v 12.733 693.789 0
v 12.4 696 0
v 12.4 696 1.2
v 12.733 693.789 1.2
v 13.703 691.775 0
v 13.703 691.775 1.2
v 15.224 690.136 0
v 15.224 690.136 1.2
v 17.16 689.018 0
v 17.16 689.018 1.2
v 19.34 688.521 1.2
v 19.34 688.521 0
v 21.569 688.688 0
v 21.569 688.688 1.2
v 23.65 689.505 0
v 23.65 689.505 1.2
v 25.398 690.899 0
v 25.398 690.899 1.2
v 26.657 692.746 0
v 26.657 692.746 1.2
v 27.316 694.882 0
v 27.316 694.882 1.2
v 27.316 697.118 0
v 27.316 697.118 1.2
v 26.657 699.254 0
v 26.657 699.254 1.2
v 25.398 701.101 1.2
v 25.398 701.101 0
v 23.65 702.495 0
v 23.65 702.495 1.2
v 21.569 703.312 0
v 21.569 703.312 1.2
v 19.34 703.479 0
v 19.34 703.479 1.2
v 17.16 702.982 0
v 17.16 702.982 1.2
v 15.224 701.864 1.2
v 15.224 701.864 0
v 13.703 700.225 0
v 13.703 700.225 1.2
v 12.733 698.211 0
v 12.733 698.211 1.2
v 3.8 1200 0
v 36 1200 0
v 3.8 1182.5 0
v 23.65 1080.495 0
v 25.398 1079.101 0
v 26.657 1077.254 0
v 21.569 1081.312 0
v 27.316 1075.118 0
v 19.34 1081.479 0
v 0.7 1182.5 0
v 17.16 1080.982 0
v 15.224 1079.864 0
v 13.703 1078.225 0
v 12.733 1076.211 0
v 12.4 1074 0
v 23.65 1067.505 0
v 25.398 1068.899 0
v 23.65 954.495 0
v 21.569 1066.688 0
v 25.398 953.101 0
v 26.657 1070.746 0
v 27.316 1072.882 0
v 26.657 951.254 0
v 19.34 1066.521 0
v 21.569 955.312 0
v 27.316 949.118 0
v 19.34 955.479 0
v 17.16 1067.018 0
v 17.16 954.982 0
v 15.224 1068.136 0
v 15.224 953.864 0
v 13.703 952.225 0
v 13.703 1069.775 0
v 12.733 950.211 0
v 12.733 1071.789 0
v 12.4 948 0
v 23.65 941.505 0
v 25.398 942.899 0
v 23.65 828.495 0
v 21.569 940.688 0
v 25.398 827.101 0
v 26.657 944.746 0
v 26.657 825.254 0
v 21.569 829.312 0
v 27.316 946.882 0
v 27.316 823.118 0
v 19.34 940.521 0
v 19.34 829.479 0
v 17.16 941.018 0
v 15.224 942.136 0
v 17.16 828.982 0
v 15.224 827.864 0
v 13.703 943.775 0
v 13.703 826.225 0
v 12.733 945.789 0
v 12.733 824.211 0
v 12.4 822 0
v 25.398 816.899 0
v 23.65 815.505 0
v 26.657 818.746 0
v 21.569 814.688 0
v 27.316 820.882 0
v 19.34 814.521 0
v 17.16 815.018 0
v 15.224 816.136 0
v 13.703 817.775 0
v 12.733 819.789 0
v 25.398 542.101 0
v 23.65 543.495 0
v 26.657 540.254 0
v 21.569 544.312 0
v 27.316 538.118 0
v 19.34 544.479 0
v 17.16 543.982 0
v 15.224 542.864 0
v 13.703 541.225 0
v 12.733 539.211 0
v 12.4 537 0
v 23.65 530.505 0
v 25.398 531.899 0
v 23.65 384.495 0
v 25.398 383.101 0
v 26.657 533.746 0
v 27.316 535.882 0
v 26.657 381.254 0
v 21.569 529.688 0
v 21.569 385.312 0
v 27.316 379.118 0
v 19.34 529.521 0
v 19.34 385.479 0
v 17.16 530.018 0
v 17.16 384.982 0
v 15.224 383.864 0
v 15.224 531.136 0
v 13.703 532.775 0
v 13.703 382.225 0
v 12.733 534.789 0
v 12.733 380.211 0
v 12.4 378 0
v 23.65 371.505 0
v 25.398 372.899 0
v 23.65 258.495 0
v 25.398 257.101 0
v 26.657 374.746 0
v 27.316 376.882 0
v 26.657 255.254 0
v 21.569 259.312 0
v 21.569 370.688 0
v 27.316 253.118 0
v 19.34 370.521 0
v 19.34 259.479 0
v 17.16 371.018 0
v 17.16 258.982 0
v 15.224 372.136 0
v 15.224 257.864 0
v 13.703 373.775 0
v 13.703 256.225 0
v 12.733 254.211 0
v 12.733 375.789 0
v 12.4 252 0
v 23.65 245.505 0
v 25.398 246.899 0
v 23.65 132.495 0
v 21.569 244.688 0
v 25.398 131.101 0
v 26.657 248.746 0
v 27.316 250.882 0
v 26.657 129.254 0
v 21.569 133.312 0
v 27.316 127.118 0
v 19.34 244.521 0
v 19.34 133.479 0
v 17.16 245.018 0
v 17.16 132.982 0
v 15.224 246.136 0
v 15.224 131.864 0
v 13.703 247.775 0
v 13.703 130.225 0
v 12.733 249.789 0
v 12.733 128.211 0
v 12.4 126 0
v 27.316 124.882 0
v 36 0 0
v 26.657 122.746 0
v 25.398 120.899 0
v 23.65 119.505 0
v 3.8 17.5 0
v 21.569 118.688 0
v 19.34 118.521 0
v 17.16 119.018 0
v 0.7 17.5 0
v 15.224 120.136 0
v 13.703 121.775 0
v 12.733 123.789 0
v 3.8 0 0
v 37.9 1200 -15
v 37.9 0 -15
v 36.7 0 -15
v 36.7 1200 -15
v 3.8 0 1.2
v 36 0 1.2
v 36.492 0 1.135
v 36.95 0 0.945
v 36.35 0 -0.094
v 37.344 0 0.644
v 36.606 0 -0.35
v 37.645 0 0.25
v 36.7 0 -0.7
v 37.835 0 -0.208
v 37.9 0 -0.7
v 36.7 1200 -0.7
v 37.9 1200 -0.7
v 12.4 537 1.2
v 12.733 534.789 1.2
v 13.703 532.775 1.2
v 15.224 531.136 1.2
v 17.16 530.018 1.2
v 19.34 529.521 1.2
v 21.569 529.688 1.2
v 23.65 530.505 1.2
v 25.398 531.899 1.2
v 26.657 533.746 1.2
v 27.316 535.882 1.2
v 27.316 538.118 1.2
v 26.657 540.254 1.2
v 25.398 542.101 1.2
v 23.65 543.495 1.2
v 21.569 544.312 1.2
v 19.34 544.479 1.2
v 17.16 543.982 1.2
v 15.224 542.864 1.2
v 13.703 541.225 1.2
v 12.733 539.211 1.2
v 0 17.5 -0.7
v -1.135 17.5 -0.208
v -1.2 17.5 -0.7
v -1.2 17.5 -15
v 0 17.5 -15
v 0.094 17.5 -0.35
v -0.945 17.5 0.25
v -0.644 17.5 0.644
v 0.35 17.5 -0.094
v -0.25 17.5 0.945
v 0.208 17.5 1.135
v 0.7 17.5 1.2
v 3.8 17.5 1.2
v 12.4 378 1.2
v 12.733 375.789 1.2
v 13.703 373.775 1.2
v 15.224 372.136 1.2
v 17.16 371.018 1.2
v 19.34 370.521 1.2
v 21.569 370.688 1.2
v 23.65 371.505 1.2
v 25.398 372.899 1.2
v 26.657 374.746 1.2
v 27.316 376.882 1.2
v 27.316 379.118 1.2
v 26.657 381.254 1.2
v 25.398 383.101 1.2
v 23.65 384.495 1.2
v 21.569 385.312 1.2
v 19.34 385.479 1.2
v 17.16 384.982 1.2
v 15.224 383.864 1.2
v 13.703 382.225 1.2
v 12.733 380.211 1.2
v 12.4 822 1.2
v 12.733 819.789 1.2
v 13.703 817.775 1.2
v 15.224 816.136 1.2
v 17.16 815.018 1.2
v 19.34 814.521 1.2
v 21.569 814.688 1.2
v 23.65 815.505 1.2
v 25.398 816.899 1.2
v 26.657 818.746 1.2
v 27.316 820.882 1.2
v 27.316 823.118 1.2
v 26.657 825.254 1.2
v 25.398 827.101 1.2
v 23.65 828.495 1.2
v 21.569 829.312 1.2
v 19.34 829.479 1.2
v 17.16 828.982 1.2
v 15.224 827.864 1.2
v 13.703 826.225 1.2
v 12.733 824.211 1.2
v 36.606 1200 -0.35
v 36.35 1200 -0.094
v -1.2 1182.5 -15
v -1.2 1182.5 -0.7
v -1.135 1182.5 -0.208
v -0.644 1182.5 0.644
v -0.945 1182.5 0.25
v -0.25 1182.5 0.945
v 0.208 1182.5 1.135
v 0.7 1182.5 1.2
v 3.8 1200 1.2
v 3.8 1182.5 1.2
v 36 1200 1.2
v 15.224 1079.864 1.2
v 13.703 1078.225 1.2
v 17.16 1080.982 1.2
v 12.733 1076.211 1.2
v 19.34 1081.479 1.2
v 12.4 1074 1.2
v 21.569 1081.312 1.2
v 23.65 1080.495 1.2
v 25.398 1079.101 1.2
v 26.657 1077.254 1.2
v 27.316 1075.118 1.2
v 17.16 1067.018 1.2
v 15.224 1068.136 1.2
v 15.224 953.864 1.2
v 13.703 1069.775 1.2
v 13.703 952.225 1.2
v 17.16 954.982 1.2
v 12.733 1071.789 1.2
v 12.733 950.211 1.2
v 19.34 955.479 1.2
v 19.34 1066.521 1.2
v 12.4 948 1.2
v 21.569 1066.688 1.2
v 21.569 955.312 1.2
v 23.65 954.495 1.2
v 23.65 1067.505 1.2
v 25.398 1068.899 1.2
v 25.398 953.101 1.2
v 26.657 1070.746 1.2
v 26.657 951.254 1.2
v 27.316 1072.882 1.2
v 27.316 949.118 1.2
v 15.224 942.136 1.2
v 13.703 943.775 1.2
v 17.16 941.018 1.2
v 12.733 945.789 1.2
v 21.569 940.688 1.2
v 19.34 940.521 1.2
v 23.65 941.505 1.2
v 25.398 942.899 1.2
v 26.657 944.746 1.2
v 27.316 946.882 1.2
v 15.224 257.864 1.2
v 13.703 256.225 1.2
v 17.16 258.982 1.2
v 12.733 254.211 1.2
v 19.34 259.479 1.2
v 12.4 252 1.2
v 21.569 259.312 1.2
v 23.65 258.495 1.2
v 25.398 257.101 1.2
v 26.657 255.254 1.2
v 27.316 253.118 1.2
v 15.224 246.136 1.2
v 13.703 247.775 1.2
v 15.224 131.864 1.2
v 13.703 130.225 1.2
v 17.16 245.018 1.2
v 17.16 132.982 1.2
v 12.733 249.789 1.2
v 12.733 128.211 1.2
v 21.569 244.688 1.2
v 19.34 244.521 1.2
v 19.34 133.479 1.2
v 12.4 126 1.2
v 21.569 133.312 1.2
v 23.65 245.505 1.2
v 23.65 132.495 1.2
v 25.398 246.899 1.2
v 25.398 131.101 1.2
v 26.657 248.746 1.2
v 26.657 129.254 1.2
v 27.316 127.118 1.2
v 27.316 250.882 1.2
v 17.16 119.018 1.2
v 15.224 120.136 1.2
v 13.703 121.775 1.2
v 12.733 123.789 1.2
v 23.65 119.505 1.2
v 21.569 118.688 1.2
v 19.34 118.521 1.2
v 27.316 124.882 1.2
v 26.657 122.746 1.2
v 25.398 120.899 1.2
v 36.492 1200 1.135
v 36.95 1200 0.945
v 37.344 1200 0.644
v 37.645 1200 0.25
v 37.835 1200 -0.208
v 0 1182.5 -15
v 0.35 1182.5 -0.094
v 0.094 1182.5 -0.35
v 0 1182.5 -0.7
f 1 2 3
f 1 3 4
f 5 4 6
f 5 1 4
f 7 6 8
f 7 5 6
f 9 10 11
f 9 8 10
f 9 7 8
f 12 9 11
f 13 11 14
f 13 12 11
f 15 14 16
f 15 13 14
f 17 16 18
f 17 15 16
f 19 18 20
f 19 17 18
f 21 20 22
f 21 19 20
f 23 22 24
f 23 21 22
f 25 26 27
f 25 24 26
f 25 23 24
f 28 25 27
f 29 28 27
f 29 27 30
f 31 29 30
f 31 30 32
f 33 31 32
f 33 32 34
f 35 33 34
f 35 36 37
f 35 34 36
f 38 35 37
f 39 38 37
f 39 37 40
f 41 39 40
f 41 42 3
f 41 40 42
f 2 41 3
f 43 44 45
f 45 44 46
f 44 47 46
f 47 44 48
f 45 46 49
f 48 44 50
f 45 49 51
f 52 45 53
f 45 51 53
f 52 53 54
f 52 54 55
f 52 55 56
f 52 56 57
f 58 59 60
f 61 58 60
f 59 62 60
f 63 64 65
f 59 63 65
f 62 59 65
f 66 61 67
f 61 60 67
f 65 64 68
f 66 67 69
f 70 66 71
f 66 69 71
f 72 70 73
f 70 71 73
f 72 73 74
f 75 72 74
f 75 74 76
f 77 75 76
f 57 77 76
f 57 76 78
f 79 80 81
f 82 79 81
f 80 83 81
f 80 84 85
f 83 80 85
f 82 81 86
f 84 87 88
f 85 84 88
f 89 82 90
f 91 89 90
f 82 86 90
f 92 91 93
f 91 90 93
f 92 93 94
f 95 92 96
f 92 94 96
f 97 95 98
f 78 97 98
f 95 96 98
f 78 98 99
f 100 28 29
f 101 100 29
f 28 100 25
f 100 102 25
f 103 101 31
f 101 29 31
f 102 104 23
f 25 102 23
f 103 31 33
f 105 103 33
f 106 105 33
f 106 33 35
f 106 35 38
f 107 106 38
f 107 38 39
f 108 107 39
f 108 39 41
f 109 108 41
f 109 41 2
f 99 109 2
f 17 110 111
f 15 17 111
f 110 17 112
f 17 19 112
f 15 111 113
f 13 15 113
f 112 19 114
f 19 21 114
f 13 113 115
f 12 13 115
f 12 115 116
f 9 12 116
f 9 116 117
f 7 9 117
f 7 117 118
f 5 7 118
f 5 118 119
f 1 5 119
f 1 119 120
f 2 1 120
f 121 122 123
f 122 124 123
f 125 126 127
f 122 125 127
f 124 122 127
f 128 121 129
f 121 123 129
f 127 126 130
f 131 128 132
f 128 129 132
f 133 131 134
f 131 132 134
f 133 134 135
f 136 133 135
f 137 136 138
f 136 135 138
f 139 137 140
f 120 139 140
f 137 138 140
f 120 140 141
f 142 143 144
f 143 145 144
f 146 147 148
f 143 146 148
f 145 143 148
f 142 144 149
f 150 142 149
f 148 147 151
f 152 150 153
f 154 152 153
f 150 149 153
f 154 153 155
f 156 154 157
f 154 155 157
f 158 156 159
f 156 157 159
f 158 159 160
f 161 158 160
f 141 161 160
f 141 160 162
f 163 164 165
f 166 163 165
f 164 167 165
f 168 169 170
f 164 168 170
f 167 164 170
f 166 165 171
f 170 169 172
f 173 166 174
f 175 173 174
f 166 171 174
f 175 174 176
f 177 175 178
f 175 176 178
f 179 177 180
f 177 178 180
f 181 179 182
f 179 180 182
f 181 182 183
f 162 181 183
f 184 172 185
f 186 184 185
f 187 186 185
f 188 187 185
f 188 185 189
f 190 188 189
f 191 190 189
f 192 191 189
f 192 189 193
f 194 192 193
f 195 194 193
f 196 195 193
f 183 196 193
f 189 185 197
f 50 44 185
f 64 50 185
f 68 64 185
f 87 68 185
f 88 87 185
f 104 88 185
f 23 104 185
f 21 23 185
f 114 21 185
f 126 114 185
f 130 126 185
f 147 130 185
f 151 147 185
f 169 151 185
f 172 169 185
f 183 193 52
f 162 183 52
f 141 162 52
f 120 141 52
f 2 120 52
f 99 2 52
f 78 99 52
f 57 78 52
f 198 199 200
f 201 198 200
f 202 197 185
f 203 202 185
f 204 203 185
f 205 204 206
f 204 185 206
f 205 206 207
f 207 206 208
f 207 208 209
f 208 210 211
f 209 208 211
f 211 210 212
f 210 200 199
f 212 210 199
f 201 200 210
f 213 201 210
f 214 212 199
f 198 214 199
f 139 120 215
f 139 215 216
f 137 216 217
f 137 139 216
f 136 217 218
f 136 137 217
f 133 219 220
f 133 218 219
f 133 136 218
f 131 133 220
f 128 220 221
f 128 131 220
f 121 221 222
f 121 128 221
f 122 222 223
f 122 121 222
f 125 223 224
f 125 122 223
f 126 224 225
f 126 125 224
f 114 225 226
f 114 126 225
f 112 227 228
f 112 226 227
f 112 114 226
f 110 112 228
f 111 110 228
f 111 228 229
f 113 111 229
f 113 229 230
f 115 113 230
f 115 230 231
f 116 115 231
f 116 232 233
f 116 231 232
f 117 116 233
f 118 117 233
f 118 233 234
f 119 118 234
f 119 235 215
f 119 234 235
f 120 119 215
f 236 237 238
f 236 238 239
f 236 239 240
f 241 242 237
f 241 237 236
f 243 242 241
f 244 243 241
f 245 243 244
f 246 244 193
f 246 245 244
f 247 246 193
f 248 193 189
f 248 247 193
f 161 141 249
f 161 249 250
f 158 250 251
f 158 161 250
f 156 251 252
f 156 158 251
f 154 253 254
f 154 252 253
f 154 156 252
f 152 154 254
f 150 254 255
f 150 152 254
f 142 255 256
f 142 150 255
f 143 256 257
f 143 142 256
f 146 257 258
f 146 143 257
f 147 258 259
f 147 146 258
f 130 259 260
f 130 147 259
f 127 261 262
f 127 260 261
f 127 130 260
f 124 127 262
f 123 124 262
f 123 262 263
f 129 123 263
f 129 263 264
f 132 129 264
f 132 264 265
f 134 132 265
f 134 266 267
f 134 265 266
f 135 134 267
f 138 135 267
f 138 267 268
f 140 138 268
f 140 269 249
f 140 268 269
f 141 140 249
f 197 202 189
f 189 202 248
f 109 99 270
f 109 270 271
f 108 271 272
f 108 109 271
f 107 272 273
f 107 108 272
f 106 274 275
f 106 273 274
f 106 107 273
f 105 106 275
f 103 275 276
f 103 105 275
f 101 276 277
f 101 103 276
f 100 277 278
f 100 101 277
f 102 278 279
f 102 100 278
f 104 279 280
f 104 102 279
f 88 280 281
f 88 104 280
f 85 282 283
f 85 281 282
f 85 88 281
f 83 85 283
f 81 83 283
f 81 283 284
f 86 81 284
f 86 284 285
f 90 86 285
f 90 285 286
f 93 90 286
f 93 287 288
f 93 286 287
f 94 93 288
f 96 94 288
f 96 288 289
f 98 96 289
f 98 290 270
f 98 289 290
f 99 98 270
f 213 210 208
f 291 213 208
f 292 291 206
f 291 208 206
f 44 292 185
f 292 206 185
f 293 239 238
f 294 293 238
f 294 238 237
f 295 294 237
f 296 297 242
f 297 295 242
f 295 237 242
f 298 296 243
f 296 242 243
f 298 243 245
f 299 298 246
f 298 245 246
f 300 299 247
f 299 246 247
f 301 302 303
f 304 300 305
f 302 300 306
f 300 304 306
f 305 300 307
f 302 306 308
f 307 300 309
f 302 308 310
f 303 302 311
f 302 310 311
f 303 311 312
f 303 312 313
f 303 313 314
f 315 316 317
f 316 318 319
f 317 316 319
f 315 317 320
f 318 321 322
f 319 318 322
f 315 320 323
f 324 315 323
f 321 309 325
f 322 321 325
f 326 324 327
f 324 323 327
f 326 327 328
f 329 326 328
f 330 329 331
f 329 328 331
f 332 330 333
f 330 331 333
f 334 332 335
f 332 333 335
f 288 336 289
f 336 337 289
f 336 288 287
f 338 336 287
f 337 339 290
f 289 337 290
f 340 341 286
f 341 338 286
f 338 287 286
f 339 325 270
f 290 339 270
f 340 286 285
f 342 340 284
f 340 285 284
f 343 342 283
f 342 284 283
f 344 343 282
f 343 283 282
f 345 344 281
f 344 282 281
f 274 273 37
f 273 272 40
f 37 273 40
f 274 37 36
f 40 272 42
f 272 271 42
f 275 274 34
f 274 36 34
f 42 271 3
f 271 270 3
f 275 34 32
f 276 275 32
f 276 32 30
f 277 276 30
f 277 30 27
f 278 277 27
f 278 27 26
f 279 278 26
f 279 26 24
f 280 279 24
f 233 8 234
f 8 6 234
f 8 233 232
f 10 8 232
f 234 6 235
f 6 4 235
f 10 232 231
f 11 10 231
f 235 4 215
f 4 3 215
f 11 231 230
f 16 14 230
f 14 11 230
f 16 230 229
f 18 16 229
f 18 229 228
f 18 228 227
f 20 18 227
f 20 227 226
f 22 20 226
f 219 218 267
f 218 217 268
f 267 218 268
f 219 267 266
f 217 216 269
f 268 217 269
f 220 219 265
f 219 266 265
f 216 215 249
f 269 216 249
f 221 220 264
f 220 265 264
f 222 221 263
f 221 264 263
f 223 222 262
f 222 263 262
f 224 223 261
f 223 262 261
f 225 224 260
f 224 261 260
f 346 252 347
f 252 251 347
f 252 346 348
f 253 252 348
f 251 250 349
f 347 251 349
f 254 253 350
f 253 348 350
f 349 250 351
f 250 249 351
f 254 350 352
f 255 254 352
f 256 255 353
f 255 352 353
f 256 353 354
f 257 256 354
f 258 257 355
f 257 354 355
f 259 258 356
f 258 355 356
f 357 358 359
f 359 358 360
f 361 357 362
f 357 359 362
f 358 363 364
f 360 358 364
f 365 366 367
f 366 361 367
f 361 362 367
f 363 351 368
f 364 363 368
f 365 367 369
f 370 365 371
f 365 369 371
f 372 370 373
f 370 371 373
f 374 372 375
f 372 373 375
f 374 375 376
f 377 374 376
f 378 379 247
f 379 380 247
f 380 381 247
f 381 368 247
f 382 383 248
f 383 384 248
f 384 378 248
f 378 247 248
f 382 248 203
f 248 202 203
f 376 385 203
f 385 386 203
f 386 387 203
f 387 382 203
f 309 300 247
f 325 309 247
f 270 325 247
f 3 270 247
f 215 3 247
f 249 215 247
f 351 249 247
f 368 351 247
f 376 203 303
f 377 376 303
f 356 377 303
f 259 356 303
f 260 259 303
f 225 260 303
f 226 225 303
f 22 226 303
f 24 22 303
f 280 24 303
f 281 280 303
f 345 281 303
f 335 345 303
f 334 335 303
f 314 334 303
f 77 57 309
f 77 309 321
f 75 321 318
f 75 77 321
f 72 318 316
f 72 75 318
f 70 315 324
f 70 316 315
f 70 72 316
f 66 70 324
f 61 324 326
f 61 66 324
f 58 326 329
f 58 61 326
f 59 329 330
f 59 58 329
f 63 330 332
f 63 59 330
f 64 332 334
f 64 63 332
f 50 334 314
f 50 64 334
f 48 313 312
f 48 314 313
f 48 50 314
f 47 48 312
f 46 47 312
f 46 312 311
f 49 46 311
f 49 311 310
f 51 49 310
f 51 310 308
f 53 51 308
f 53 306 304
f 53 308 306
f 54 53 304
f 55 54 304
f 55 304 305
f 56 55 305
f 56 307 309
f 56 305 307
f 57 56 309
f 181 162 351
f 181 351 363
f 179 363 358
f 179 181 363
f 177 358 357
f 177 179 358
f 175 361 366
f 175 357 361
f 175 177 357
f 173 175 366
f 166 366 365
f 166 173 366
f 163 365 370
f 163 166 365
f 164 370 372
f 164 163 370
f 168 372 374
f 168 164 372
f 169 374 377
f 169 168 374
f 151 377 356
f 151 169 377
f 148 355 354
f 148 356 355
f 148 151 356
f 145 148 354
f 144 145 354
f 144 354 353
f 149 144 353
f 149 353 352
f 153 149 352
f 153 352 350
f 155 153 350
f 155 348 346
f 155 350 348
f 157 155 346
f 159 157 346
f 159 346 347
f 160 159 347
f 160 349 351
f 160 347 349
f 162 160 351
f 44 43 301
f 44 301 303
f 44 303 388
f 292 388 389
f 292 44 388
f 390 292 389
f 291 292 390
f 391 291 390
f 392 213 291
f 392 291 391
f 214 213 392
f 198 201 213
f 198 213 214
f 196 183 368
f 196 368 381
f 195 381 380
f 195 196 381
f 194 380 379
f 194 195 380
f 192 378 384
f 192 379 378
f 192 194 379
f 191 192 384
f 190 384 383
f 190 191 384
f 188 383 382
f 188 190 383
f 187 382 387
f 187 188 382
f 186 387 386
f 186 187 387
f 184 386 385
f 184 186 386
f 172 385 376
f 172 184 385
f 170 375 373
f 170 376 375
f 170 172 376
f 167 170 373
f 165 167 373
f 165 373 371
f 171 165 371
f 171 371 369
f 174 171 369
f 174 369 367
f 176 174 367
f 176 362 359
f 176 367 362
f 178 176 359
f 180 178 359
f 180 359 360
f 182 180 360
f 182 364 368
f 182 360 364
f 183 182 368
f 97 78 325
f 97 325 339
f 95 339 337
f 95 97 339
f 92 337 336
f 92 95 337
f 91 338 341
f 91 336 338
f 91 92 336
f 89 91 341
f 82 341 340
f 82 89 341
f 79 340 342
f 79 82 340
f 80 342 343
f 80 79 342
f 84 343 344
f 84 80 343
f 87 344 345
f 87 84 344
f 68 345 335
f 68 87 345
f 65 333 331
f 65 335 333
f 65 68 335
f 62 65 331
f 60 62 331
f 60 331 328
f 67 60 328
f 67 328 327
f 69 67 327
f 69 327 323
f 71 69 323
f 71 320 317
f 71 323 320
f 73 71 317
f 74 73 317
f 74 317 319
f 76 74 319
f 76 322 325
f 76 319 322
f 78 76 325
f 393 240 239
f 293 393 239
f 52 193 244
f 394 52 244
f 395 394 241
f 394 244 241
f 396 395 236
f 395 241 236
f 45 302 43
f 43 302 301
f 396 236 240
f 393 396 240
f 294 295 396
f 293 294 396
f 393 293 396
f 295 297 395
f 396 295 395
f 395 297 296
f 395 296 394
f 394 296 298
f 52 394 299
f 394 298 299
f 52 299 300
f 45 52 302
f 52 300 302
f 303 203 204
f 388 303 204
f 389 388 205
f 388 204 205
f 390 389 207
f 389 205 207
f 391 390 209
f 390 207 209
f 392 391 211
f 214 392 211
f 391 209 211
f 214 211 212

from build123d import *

# Parameters (mm, degrees)
BASE_FLANGE1_DEPTH      = 1200
SKETCH6_W               = 5
SKETCH6_H               = 17
CUT_EXTRUDE1_DEPTH      = 10
SKETCH7_W               = 5
SKETCH7_H               = 17.5
CUT_EXTRUDE2_DEPTH      = 1201.707645516
CUT_EXTRUDE3_DEPTH      = 1201.707645516
CUT_EXTRUDE3_DEPTH_BACK = 1201.707645516
SKETCH8_R               = 7.5


# Sheet-metal steps are written as plain solids
with BuildPart() as part:
    # Sketch1 → Base-Flange1 (new body)
    with BuildSketch(Plane(origin=(0, 0, 0), x_dir=(1, 0, 0), z_dir=(0, 1, 0))):
        with BuildLine():
            Line((36.7, 15), (36.7, 0.7))
            ThreePointArc((36.7, 0.7), (36.494974747, 0.205025253), (36, 0))
            Line((36, 0), (0.7, 0))
            ThreePointArc((0.7, 0), (0.205025253, 0.205025253), (0, 0.7))
            Line((0, 0.7), (0, 15))
            Line((0, 15), (-1.2, 15))
            Line((-1.2, 15), (-1.2, 0.7))
            ThreePointArc((-1.2, 0.7), (-0.643502884, -0.643502884), (0.7, -1.2))
            Line((0.7, -1.2), (36, -1.2))
            ThreePointArc((36, -1.2), (37.343502884, -0.643502884), (37.9, 0.7))
            Line((37.9, 0.7), (37.9, 15))
            Line((37.9, 15), (36.7, 15))
        make_face()
    extrude(amount=BASE_FLANGE1_DEPTH)

    # Sketch6 → Cut-Extrude1 (cut)
    with BuildSketch(Plane.ZY.offset(1.2)):
        with Locations((-12.5, 1191.5)):
            Rectangle(SKETCH6_W, SKETCH6_H)
        with Locations((-12.5, 8.5)):
            Rectangle(SKETCH6_W, SKETCH6_H)
    extrude(amount=-CUT_EXTRUDE1_DEPTH, mode=Mode.SUBTRACT)

    # Sketch7 → Cut-Extrude2 (cut, through all)
    with BuildSketch(Plane.XY.offset(1.2)):
        with Locations((1.3, 8.75)):
            Rectangle(SKETCH7_W, SKETCH7_H)
        with Locations((1.3, 1191.25)):
            Rectangle(SKETCH7_W, SKETCH7_H)
    extrude(amount=-CUT_EXTRUDE2_DEPTH, mode=Mode.SUBTRACT)

    # Sketch8 → Cut-Extrude3 (cut, two sides: drawn at the far end of the back side and taken through both)
    with BuildSketch(Plane.XY.offset(1.2).offset(-CUT_EXTRUDE3_DEPTH_BACK)):
        with Locations(Location((19.9, 126, 0), (0, 0, 180))):
            Circle(SKETCH8_R)
        with Locations(Location((19.9, 252, 0), (0, 0, 180))):
            Circle(SKETCH8_R)
        with Locations(Location((19.9, 378, 0), (0, 0, 180))):
            Circle(SKETCH8_R)
        with Locations(Location((19.9, 1074, 0), (0, 0, 180))):
            Circle(SKETCH8_R)
        with Locations(Location((19.9, 948, 0), (0, 0, 180))):
            Circle(SKETCH8_R)
        with Locations(Location((19.9, 822, 0), (0, 0, 180))):
            Circle(SKETCH8_R)
        with Locations(Location((19.9, 696, 0), (0, 0, 180))):
            Circle(SKETCH8_R)
        with Locations(Location((19.9, 537, 0), (0, 0, 180))):
            Circle(SKETCH8_R)
    extrude(amount=CUT_EXTRUDE3_DEPTH + CUT_EXTRUDE3_DEPTH_BACK, mode=Mode.SUBTRACT)


solid = part.part
